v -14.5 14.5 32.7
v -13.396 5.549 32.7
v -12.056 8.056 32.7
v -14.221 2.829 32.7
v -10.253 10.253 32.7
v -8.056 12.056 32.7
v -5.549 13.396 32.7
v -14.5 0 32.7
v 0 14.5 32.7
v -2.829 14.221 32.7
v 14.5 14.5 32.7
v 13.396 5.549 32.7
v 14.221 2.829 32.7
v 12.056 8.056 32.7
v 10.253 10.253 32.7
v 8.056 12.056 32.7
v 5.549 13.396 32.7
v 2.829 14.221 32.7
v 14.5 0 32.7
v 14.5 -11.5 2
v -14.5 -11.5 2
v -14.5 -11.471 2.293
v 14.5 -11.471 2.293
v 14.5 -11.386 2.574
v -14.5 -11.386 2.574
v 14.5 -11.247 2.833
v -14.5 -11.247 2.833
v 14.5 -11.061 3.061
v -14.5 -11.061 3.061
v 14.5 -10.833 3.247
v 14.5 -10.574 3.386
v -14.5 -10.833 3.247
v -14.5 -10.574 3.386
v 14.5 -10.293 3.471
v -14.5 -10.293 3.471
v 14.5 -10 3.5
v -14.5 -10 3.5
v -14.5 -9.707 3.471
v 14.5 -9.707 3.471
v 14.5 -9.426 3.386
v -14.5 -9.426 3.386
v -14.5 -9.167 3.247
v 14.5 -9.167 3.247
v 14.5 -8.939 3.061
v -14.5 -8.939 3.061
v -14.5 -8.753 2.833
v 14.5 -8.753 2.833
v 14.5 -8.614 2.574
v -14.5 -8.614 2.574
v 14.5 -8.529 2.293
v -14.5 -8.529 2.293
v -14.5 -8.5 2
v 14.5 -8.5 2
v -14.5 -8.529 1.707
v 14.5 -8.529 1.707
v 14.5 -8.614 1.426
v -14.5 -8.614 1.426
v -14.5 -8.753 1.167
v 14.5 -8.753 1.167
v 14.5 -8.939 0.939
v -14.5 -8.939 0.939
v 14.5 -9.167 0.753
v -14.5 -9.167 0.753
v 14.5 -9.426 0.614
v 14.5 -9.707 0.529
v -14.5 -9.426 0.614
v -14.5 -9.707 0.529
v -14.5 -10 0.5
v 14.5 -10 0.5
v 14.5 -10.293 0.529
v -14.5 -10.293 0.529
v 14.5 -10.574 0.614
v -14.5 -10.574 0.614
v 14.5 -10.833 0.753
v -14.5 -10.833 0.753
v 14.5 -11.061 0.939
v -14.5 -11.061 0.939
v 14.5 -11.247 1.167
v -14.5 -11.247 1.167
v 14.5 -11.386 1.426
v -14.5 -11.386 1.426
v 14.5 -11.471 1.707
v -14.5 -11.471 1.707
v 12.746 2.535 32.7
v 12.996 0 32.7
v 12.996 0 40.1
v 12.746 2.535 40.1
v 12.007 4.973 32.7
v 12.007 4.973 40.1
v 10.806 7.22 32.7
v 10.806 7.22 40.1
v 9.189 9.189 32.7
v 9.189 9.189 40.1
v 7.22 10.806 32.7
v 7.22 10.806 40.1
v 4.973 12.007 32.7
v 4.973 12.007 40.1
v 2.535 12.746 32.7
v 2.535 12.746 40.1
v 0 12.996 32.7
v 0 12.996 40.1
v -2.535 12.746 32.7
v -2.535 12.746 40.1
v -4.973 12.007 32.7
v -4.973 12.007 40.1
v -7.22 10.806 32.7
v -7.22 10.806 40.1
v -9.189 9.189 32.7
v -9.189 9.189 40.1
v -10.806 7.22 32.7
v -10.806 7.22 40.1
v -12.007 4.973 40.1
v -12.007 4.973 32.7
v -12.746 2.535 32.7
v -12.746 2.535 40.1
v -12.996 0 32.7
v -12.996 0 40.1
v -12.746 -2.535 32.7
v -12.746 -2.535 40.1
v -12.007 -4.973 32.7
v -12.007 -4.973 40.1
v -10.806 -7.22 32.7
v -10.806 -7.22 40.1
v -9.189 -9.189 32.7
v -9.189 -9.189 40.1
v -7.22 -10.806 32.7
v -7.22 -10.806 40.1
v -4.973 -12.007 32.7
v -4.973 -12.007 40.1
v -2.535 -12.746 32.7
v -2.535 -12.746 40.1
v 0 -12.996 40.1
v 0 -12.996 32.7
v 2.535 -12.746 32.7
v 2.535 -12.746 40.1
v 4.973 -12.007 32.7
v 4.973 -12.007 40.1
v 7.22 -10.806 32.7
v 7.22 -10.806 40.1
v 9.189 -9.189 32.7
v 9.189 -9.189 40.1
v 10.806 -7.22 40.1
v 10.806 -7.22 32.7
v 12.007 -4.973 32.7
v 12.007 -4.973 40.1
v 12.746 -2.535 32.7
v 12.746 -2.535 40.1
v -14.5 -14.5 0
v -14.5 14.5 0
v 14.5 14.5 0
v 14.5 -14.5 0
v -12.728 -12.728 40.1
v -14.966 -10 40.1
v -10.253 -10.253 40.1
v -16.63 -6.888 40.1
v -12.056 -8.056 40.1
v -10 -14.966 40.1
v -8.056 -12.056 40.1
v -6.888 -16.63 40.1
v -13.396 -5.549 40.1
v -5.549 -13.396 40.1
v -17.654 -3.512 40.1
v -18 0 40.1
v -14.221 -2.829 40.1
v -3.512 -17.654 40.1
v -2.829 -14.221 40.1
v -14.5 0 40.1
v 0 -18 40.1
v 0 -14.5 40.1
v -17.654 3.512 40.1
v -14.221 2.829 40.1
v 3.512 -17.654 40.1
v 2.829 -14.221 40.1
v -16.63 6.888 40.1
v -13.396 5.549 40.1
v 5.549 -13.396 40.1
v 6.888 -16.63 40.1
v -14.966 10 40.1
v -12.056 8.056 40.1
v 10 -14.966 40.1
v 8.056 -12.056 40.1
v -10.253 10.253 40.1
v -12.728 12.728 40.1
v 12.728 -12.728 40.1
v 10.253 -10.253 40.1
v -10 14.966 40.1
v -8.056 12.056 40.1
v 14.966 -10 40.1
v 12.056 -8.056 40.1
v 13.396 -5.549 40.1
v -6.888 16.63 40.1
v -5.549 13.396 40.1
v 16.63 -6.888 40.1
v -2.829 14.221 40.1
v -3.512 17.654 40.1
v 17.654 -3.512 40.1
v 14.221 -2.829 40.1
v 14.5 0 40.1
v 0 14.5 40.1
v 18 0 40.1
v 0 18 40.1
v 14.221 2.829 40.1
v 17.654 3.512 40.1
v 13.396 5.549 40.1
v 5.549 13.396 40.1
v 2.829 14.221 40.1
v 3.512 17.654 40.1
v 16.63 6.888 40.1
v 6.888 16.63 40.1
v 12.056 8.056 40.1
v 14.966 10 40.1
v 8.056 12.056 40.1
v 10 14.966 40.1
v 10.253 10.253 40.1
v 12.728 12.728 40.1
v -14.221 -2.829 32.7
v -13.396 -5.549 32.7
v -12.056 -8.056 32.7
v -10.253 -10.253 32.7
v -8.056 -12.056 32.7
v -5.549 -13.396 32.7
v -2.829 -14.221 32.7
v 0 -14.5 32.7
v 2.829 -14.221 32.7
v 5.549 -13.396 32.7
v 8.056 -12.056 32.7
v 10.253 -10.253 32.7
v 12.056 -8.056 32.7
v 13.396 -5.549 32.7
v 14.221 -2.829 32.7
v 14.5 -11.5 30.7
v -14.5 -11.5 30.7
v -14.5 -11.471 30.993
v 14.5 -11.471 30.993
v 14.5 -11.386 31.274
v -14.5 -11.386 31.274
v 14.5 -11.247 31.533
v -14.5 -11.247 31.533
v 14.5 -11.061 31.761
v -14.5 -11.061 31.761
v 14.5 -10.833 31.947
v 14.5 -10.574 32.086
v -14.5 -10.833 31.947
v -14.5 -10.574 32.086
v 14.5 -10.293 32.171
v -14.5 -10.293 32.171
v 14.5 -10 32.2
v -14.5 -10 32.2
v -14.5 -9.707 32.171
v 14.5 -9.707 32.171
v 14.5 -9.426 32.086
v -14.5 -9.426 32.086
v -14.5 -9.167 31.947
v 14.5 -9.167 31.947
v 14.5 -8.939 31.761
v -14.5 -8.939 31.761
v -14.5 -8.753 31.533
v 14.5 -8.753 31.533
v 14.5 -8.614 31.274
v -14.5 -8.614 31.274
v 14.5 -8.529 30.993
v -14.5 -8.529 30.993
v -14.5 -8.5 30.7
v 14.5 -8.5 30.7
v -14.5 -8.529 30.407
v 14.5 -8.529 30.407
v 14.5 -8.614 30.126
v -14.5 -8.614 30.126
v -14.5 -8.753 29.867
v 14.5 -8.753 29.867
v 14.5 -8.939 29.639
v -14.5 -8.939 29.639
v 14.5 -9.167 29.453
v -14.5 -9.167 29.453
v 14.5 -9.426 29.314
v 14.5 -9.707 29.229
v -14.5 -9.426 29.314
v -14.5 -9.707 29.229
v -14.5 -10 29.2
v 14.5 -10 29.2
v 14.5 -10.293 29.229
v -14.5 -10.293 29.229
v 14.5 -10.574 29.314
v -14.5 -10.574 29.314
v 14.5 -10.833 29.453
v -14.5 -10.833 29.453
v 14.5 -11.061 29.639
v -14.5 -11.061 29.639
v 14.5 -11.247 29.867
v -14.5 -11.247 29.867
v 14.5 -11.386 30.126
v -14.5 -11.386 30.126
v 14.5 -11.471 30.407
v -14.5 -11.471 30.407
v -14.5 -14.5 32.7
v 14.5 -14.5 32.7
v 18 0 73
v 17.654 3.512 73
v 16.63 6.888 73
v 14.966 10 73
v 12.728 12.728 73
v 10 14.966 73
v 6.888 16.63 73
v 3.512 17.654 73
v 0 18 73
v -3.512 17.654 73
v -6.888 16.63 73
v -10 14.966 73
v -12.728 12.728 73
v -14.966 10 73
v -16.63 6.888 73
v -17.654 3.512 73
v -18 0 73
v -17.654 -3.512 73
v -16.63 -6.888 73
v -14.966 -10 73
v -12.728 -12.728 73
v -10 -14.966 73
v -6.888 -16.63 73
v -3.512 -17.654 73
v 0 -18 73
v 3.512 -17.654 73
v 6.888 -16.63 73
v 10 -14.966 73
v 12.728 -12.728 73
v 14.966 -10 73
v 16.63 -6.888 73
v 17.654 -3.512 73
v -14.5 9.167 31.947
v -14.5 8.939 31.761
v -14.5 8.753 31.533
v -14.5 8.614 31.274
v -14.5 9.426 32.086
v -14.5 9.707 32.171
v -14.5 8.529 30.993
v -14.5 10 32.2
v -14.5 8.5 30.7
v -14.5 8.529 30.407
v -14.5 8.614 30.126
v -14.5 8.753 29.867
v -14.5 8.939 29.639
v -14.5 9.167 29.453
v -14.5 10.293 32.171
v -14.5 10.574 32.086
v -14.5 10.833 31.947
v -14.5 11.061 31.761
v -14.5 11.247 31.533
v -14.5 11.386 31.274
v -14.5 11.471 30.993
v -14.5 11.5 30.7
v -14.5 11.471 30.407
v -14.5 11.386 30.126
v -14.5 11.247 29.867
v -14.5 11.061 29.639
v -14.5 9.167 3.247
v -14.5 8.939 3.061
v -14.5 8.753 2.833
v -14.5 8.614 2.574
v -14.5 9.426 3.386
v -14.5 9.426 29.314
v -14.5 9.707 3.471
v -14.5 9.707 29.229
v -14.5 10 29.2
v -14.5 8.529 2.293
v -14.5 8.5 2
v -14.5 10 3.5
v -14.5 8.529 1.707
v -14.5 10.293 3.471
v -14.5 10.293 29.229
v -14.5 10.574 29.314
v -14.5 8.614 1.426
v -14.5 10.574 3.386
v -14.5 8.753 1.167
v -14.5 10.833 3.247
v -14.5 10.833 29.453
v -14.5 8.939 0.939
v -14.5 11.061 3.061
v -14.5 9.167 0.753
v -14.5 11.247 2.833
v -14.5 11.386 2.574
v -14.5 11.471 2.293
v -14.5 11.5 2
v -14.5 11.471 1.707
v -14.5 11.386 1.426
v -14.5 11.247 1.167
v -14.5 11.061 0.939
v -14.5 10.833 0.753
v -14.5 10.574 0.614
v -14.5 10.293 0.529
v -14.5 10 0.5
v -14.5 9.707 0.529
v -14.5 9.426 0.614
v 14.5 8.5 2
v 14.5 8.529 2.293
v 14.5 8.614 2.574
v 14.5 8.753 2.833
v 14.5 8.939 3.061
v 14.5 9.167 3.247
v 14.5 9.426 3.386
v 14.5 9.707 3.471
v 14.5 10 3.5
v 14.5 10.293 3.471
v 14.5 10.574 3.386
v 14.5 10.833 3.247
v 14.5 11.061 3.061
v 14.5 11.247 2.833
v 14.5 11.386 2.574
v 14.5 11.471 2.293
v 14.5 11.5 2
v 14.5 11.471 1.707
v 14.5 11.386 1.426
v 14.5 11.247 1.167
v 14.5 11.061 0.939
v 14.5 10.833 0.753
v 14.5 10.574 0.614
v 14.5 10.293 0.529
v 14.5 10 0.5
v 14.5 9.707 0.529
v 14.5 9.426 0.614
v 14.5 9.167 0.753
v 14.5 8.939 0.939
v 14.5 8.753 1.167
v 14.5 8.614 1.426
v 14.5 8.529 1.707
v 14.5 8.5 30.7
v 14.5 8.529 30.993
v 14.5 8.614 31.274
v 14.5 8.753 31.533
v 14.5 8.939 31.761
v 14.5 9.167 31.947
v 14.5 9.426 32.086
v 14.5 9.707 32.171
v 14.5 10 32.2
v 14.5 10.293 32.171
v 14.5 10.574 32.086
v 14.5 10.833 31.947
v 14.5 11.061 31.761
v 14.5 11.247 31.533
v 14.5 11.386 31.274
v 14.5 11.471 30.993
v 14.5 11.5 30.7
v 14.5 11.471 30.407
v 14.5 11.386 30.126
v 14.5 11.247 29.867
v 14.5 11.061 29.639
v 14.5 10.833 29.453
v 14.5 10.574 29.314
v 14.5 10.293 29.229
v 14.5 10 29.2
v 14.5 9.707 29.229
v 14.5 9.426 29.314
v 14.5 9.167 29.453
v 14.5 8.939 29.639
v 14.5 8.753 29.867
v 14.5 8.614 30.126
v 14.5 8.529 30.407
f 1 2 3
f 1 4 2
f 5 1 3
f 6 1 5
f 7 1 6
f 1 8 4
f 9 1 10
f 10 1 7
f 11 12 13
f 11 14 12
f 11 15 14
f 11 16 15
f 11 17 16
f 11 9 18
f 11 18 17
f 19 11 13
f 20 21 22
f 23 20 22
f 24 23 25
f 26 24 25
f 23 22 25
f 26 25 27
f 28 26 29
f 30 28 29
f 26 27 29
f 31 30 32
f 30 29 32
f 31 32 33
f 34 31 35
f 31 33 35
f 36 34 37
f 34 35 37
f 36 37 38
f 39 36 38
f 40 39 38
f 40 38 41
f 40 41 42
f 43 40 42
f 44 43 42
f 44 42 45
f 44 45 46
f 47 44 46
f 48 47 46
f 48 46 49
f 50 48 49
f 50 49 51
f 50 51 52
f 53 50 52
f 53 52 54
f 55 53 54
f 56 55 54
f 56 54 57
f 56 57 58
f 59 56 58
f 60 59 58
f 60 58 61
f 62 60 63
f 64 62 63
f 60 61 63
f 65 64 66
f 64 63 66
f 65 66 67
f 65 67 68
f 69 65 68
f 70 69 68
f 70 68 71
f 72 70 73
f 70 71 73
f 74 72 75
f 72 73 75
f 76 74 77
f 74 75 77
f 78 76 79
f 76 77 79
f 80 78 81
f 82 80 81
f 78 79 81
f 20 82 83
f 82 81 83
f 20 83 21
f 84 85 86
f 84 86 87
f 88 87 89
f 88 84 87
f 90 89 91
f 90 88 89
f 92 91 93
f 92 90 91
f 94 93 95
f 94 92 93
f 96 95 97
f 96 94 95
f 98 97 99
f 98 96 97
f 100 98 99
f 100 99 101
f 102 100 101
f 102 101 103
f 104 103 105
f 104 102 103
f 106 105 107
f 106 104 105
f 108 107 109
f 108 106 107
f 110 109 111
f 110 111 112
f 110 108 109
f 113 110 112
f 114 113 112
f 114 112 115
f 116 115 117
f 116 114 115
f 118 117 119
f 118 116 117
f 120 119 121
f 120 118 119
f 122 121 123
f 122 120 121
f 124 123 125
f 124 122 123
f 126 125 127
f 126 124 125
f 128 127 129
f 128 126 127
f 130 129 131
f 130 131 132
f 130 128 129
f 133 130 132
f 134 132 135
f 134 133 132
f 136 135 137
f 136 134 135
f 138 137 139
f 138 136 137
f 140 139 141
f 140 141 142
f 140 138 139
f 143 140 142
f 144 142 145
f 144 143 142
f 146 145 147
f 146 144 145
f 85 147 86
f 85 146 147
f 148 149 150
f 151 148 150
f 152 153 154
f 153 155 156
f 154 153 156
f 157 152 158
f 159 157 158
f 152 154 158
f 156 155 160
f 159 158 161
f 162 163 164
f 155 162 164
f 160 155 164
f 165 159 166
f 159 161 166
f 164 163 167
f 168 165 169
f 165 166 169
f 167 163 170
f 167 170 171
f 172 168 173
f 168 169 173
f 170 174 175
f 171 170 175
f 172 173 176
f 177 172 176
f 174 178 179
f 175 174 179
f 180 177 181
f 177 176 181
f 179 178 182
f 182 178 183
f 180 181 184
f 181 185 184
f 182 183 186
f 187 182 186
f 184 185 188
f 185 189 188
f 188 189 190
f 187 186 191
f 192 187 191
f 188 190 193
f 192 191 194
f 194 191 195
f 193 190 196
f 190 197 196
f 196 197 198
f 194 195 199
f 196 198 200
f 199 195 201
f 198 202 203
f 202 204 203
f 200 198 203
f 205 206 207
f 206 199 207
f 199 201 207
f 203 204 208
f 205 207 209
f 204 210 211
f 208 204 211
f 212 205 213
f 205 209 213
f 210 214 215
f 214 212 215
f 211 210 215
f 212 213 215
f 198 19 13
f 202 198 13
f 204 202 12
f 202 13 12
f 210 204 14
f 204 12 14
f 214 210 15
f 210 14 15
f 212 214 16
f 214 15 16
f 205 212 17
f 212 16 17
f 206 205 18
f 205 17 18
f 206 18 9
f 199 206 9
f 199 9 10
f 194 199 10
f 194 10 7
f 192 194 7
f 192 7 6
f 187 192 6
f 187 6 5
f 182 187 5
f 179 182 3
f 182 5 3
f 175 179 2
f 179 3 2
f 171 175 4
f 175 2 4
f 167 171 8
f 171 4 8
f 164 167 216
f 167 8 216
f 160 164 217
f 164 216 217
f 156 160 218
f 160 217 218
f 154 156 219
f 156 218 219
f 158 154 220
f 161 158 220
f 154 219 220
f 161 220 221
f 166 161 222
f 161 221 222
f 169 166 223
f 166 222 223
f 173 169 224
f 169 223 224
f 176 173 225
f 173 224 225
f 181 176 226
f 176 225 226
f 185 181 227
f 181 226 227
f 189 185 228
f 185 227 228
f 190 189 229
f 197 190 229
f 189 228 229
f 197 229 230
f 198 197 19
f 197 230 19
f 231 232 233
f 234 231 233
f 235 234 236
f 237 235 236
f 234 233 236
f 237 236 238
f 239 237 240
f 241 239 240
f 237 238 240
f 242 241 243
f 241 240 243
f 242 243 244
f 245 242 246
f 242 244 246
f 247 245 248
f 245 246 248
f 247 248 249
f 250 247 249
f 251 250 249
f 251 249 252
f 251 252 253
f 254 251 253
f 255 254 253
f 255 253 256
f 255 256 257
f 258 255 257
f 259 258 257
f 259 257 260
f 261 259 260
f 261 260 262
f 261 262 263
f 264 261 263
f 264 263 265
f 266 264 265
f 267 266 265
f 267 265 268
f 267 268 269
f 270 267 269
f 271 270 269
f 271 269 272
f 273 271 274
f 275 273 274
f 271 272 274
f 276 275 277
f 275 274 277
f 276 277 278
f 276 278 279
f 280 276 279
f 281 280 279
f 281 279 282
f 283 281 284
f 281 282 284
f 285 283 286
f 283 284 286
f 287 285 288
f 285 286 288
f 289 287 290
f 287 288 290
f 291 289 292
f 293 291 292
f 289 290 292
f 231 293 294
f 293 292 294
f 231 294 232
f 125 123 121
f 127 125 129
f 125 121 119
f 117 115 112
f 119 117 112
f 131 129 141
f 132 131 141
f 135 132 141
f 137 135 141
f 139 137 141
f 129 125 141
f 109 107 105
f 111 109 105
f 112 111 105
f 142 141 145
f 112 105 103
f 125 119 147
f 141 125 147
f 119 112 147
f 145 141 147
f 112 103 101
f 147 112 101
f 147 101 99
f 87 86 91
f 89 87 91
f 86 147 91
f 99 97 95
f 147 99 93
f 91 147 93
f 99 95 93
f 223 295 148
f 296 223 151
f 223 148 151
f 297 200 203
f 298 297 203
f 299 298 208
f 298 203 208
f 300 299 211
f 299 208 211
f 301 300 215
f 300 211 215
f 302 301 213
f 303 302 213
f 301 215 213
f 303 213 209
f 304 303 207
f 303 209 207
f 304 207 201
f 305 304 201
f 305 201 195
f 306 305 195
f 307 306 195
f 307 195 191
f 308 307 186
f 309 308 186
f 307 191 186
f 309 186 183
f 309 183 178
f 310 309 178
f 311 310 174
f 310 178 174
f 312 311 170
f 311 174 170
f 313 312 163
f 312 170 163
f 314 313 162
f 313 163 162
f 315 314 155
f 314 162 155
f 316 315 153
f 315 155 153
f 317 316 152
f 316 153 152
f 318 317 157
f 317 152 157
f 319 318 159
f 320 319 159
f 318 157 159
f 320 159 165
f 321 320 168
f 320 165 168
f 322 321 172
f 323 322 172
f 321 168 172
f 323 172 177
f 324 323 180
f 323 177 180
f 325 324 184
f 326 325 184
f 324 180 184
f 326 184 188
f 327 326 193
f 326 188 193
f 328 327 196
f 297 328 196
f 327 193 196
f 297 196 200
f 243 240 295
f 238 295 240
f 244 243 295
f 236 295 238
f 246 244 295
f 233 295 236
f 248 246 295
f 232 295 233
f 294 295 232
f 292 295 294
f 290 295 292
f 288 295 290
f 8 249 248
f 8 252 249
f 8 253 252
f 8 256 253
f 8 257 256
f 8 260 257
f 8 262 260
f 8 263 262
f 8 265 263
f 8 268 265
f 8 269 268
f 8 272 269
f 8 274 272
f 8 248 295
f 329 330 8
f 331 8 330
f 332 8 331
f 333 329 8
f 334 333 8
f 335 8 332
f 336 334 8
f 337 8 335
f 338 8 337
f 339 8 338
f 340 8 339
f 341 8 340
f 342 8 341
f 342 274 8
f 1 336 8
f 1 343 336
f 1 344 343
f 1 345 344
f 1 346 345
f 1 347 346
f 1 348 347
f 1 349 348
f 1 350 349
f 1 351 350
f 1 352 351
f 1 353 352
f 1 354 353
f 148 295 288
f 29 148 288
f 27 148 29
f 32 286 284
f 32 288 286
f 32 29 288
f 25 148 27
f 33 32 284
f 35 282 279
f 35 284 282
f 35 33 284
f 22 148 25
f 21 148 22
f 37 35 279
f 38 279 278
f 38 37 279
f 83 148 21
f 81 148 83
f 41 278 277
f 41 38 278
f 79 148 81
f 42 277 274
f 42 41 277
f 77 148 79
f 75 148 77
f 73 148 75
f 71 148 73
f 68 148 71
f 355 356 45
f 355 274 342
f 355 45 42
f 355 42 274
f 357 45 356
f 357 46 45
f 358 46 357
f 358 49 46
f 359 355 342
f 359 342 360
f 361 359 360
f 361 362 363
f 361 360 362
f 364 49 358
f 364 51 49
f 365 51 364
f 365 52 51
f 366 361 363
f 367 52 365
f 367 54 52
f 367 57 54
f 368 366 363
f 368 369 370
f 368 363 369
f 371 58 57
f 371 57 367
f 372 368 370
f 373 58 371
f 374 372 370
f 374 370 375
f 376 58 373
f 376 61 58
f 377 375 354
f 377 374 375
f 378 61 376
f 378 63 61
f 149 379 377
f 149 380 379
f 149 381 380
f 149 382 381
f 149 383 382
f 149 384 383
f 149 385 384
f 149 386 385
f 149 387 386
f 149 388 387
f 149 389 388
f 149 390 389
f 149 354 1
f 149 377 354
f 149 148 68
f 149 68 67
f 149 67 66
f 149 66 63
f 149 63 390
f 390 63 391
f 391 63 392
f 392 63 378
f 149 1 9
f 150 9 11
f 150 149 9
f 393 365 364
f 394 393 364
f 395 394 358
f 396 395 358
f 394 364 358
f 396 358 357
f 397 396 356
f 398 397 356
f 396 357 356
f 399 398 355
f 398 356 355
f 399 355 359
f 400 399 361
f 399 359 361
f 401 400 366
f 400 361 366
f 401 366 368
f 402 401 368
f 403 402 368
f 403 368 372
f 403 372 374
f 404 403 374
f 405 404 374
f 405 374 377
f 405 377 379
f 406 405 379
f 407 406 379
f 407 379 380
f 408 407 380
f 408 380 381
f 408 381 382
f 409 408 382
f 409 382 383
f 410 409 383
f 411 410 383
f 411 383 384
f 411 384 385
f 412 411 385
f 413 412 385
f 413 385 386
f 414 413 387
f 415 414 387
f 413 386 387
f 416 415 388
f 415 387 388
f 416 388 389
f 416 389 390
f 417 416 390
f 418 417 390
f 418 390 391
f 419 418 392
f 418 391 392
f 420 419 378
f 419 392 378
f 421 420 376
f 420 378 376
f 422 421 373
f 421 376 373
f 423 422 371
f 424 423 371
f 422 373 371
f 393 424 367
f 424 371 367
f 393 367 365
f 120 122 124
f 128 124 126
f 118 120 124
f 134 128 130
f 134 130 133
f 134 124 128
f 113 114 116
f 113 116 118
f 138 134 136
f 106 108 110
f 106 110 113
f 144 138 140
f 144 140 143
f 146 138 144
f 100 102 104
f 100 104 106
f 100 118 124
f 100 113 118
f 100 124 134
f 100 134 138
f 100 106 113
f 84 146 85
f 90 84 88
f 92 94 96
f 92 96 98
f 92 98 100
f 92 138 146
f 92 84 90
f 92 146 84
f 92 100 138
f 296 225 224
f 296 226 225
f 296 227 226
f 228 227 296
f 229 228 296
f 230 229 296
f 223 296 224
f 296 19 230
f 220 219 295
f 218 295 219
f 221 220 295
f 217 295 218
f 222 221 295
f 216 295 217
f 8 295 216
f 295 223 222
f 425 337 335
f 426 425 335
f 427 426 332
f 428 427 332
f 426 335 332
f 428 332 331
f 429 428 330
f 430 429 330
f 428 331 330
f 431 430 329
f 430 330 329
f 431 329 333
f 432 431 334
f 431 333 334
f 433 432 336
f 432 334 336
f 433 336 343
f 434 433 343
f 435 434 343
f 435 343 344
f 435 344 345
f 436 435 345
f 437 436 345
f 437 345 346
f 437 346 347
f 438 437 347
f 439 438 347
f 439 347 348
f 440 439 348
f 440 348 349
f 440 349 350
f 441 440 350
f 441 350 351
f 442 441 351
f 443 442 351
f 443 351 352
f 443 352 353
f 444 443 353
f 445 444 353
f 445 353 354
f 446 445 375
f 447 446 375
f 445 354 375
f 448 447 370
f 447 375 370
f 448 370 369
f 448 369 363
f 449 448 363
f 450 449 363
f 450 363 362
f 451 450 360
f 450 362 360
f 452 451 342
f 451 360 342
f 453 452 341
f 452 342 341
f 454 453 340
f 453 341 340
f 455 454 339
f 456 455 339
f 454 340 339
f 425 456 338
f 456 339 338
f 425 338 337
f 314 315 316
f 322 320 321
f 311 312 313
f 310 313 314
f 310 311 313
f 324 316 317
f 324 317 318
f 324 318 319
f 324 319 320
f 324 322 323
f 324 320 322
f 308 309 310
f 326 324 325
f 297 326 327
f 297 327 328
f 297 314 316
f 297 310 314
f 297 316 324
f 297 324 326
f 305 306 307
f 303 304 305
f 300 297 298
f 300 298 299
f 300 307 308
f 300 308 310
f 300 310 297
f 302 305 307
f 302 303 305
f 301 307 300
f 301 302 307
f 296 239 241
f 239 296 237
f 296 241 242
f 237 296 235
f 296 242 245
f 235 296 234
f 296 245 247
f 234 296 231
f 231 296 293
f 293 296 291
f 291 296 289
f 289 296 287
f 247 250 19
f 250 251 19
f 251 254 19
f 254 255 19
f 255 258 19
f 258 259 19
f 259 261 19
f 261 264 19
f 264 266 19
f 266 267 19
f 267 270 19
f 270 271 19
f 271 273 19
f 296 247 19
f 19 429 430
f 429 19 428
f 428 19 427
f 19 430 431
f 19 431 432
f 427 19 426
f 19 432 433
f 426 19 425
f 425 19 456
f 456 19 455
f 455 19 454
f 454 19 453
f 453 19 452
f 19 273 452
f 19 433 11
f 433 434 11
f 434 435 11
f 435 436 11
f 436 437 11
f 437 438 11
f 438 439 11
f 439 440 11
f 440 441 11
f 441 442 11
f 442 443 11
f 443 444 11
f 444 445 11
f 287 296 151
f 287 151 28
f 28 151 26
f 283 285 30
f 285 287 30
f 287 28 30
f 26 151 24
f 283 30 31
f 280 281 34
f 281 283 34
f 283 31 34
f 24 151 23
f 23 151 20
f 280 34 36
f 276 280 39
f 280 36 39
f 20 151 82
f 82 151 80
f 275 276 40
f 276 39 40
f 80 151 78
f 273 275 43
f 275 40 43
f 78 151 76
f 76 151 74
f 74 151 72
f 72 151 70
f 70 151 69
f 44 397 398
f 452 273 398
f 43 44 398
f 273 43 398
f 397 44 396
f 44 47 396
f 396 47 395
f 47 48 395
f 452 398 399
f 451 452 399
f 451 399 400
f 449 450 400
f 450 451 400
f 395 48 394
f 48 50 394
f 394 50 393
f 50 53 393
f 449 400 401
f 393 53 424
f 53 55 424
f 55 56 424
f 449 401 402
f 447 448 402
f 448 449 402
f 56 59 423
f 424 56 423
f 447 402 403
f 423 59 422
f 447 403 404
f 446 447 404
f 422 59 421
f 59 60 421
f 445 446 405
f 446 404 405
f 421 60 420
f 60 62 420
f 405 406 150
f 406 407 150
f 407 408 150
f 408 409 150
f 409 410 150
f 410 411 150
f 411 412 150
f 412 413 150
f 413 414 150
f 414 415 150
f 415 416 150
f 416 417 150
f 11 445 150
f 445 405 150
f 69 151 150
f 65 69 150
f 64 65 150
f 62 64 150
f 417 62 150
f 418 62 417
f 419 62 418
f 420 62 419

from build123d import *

# Parameters (mm, degrees)
SKETCH_1_W          = 29
SKETCH_1_H          = 29
EXTRUDE_1_DEPTH     = 32.7
SKETCH_2_R          = 14.5
SKETCH_2_R_2        = 12.995867769
EXTRUDE_2_DEPTH     = 7.4
SKETCH_3_R          = 1.5
CUT_EXTRUDE_1_DEPTH = 42.4
SKETCH_4_R          = 18
EXTRUDE_3_DEPTH     = 32.9


with BuildPart() as part:
    # 草图1 → 凸台-拉伸1 (new body)
    with BuildSketch(Plane.XY):
        Rectangle(SKETCH_1_W, SKETCH_1_H)
    extrude(amount=EXTRUDE_1_DEPTH)

    # 草图2 → 凸台-拉伸2 (add)
    with BuildSketch(Plane.XY.offset(32.7)):
        Circle(SKETCH_2_R)
        Circle(SKETCH_2_R_2, mode=Mode.SUBTRACT)
    extrude(amount=EXTRUDE_2_DEPTH)

    # 草图3 → 切除-拉伸1 (cut)
    with BuildSketch(Plane.ZY.offset(14.5)):
        with Locations(Location((2, 10, 0), (0, 0, 270))):
            Circle(SKETCH_3_R)
        with Locations(Location((30.7, 10, 0), (0, 0, 270))):
            Circle(SKETCH_3_R)
        with Locations(Location((30.7, -10, 0), (0, 0, 270))):
            Circle(SKETCH_3_R)
        with Locations(Location((2, -10, 0), (0, 0, 270))):
            Circle(SKETCH_3_R)
    extrude(amount=-CUT_EXTRUDE_1_DEPTH, mode=Mode.SUBTRACT)

    # 草图4 → 凸台-拉伸3 (add)
    with BuildSketch(Plane.XY.offset(40.1)):
        Circle(SKETCH_4_R)
    extrude(amount=EXTRUDE_3_DEPTH)


solid = part.part
